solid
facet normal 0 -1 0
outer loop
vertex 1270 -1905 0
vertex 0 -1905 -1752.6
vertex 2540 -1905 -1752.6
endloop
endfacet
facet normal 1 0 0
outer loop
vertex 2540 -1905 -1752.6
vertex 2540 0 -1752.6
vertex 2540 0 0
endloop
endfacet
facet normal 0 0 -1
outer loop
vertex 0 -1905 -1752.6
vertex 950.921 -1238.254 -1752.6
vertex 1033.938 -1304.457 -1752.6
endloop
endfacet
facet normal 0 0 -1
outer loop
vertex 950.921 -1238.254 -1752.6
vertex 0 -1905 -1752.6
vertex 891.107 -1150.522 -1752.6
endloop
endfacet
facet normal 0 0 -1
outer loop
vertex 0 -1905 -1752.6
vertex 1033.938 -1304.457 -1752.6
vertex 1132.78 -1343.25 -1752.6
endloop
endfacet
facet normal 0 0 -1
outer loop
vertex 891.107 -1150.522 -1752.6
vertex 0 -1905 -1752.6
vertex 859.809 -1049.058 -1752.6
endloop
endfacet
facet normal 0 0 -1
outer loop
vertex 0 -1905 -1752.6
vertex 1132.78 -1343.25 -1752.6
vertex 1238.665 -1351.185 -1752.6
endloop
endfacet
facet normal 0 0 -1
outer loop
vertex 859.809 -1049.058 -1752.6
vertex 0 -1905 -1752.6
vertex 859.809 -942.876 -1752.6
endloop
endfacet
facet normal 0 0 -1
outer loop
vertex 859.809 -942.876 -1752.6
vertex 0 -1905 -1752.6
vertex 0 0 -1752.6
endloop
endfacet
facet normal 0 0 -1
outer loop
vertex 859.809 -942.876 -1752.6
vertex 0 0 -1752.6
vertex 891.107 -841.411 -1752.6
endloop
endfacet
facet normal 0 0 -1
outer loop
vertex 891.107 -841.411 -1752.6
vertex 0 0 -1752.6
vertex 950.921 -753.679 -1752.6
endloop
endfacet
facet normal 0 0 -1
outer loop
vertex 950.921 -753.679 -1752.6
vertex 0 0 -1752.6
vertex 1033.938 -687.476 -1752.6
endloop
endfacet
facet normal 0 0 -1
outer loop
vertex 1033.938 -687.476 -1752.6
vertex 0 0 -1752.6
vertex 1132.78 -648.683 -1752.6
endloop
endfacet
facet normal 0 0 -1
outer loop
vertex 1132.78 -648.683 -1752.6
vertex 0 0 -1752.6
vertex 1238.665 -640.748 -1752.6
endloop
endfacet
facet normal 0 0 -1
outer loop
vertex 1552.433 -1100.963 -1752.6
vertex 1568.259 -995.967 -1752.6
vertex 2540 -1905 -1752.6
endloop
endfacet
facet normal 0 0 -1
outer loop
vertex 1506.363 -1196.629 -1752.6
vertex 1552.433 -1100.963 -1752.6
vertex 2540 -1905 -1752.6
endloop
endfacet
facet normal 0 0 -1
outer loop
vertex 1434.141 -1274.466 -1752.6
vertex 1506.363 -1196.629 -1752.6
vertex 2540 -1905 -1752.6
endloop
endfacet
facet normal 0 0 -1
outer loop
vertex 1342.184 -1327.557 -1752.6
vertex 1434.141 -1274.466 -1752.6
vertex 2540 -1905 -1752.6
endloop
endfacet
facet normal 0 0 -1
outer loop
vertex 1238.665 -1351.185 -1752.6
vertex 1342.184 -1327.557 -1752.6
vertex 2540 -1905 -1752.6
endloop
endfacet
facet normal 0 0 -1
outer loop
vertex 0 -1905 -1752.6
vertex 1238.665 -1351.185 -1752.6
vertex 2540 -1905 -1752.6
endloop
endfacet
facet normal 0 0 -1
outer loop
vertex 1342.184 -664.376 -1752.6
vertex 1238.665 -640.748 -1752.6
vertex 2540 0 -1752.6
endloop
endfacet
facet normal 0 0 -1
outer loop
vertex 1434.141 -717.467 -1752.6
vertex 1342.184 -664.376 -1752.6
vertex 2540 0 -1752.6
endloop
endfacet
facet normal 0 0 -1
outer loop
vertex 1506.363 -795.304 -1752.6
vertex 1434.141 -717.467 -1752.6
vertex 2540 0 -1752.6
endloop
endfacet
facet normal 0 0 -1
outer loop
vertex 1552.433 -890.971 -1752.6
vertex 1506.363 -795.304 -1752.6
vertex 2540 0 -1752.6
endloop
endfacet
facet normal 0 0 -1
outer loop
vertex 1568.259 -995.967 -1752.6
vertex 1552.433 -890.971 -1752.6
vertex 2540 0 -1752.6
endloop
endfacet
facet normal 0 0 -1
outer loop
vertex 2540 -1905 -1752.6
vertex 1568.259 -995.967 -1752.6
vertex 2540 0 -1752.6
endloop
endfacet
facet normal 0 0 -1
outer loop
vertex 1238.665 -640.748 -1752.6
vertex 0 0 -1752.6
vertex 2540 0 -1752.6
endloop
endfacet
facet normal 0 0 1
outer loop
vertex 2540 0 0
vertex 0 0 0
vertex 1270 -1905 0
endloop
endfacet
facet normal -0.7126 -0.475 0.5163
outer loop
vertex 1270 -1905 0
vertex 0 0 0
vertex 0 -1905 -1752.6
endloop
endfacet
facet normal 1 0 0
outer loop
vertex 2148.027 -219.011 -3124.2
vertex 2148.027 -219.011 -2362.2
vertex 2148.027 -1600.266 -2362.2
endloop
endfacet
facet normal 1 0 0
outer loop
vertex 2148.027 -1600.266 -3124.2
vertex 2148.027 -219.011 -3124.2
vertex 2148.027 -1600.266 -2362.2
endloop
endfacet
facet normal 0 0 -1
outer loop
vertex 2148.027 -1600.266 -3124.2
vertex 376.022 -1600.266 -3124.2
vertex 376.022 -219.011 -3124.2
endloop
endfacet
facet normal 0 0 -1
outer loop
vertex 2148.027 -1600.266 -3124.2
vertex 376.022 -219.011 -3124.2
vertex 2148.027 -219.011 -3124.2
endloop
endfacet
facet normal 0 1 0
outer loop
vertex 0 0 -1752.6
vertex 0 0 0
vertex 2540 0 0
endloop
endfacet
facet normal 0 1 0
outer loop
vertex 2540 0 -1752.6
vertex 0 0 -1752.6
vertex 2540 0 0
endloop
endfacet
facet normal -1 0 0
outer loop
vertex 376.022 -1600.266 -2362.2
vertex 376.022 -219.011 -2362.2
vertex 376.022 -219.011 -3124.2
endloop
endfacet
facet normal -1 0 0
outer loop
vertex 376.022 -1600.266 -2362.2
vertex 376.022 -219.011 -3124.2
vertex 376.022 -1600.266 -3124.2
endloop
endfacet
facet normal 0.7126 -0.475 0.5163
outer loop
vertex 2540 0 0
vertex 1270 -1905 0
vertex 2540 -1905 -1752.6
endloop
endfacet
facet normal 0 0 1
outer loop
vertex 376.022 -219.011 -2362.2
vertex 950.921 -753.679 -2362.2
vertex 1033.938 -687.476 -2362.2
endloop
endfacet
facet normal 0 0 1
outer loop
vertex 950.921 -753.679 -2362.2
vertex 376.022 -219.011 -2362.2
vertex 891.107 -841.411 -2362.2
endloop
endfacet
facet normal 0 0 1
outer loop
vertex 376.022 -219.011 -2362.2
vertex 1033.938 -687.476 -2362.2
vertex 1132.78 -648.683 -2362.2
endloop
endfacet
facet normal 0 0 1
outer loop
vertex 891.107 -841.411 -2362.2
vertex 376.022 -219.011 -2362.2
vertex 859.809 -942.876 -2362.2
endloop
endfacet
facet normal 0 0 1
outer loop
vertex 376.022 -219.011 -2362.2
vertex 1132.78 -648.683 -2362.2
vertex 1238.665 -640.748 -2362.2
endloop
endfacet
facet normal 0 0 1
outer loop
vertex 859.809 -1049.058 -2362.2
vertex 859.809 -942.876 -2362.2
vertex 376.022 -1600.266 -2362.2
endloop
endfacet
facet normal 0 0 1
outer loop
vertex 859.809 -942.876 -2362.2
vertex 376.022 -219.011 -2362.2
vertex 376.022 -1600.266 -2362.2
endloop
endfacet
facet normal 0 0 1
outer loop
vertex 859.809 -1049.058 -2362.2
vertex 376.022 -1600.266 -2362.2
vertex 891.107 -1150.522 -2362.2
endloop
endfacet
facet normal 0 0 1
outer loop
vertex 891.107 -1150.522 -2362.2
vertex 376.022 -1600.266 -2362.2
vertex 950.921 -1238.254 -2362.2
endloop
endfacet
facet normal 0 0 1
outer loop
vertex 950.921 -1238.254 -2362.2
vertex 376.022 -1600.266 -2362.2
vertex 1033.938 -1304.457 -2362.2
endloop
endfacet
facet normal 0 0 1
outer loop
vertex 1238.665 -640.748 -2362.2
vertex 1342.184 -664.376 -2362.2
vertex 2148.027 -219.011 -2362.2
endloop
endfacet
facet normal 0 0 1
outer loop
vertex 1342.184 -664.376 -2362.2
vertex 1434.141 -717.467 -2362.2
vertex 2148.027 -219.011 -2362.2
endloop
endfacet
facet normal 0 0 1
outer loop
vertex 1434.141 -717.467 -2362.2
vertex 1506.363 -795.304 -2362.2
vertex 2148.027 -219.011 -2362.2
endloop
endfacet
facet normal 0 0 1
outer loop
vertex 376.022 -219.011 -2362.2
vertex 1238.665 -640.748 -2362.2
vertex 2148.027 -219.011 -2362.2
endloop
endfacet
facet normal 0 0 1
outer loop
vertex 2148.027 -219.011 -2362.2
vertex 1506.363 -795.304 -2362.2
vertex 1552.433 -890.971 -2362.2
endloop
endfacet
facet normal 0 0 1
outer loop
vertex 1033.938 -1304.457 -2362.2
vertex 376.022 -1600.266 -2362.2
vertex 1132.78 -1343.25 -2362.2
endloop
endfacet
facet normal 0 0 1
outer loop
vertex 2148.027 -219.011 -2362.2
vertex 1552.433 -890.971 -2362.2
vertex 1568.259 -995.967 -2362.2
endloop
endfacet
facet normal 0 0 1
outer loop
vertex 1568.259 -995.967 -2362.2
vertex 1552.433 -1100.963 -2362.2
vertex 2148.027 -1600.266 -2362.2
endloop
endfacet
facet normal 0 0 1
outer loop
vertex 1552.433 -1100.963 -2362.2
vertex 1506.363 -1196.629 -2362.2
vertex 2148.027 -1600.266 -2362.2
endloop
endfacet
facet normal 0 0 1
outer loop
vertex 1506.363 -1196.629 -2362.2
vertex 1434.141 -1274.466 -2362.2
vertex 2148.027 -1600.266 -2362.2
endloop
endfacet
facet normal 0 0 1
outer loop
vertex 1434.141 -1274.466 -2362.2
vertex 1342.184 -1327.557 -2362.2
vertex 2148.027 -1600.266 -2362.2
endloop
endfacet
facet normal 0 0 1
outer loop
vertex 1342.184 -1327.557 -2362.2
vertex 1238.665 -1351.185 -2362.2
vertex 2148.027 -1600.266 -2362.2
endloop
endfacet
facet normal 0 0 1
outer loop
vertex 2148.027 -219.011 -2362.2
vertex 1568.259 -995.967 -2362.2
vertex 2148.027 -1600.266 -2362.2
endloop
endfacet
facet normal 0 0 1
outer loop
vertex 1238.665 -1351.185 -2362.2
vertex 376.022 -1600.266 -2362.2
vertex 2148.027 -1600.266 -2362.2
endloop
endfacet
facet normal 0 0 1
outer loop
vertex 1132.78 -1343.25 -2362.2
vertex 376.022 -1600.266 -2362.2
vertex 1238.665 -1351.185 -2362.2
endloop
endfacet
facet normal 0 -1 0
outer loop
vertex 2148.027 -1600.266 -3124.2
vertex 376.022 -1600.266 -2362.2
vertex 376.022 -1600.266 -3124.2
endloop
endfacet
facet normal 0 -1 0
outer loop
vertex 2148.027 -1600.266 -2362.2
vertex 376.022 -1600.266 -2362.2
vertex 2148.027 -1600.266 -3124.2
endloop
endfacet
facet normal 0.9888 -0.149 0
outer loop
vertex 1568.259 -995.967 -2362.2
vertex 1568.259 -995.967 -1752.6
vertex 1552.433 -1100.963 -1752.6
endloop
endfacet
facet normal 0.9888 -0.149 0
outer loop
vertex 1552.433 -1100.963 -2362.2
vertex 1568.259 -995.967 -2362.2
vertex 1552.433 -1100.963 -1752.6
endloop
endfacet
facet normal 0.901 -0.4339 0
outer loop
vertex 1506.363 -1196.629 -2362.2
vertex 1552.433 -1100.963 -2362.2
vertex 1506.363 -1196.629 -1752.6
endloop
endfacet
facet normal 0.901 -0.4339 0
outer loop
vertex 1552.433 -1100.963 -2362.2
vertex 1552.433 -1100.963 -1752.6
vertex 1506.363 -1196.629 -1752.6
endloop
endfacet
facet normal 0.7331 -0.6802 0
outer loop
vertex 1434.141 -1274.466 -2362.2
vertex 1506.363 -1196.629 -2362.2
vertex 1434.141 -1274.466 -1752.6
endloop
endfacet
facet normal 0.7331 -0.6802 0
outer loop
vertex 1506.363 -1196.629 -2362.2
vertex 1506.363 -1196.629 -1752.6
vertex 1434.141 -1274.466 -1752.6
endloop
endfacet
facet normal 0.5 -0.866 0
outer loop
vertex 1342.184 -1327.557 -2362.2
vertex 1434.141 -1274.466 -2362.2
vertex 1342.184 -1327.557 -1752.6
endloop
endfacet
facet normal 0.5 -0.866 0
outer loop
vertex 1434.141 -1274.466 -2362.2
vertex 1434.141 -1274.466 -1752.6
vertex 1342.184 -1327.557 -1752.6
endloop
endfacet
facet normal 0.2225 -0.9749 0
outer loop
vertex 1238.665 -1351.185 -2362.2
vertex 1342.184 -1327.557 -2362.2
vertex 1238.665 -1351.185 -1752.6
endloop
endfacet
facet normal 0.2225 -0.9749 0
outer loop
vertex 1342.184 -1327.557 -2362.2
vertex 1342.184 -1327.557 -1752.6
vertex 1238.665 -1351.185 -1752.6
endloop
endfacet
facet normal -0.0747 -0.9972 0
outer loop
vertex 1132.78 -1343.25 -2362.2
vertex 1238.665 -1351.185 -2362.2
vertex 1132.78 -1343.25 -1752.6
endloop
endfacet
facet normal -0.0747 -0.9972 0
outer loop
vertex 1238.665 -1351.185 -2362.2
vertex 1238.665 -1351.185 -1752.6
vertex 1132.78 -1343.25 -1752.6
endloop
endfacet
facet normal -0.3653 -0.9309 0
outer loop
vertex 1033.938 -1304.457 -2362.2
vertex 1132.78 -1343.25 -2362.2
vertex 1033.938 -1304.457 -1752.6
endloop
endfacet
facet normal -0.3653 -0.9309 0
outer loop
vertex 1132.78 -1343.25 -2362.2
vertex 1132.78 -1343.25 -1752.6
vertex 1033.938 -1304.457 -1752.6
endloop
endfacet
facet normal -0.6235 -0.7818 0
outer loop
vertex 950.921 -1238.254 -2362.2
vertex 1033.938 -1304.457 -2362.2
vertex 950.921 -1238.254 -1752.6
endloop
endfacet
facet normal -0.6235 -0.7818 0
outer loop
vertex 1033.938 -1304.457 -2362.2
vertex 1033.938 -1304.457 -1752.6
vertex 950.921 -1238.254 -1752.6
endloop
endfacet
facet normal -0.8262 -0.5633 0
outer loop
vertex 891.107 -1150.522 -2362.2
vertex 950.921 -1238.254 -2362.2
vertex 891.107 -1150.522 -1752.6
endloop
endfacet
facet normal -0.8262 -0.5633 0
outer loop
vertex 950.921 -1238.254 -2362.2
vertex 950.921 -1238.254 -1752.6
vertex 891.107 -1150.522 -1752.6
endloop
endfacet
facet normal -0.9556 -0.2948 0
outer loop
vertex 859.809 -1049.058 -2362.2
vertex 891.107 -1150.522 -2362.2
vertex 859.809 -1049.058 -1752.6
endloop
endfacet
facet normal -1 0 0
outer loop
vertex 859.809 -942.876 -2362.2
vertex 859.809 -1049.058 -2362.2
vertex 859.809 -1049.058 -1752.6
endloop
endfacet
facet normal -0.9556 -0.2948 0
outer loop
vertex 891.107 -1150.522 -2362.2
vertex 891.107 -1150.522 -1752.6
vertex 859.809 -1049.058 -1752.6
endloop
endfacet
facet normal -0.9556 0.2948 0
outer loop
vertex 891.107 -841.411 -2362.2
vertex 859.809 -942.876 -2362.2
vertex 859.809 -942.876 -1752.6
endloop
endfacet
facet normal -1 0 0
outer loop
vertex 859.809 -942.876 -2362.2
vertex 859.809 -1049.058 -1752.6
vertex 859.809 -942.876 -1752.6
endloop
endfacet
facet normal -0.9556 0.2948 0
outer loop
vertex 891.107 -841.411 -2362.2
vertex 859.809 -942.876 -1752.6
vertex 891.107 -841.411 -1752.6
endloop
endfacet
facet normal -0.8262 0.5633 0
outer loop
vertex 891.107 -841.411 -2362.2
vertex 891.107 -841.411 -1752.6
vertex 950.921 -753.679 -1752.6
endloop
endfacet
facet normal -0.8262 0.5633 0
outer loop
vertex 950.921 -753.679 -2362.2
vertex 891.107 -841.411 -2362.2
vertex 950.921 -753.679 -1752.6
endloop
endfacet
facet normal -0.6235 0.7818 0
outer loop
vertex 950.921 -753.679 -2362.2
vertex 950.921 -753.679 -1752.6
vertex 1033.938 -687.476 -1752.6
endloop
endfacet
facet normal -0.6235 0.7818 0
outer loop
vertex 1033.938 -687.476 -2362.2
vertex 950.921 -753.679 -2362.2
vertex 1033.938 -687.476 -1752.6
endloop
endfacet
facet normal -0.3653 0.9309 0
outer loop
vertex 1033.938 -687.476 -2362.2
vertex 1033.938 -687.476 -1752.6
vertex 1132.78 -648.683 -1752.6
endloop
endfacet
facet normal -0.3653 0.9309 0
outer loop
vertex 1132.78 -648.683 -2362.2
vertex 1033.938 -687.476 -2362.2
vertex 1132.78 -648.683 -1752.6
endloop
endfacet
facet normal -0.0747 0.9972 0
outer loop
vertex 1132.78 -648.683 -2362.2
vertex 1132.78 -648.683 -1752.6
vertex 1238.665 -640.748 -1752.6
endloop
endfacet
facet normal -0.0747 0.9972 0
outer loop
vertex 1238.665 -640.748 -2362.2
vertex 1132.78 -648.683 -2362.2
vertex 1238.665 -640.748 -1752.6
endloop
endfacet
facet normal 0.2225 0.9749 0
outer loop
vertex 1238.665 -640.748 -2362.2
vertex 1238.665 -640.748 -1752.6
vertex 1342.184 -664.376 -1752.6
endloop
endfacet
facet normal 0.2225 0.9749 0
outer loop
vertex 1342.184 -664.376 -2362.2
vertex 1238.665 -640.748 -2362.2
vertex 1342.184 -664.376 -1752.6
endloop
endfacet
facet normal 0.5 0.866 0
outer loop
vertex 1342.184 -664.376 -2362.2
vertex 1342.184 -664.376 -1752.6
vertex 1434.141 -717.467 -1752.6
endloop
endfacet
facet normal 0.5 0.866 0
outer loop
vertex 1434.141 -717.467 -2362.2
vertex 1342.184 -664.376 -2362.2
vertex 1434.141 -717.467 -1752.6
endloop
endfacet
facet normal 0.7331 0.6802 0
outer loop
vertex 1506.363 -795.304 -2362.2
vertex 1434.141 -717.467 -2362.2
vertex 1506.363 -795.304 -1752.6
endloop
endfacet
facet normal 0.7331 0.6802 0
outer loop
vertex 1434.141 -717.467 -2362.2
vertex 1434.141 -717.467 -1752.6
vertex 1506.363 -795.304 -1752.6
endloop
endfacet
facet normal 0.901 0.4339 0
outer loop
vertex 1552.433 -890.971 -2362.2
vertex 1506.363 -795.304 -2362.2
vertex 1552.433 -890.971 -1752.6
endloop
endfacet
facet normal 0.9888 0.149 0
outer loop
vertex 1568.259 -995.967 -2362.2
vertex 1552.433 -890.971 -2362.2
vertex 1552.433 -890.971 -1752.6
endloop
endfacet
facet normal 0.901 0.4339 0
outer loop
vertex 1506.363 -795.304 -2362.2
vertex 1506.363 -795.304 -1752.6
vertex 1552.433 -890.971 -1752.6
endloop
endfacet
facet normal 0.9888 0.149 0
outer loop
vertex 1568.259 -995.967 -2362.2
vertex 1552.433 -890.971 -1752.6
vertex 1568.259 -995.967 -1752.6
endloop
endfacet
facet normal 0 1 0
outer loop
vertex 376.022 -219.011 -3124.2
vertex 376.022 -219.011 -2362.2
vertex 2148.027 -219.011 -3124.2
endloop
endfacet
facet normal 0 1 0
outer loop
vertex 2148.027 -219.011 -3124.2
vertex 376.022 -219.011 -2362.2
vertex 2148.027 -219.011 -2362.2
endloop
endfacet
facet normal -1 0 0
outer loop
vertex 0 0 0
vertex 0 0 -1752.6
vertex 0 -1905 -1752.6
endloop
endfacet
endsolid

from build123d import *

# Parameters (mm, degrees)
F0_W      = 2540
F0_H      = 1752.6
F1_DEPTH  = 1905
F6_DEPTH  = 2540
F9_DEPTH  = 2540
F10_R     = 356.2143235098
F11_DEPTH = 609.6
F12_W     = 1772.005200386
F12_H     = 1381.2552392483
F13_DEPTH = 762


with BuildPart() as f1:
    # F0 (on Front) → F1 (new body)
    with BuildSketch(Plane.XZ):
        with Locations((1270, -876.3)):
            Rectangle(F0_W, F0_H)
    extrude(amount=F1_DEPTH)

    # F5 (on 3pt) → F6 (cut)
    with BuildSketch(Plane(origin=(1289.6384771249, -859.7589847499, 934.5206355977), x_dir=(0.3846597509, 0.8799667459, 0.2787389499), z_dir=(0.7125529341, -0.4750352894, 0.5163427059))):
        Polygon((3353.7168502808, 2692.031621933), (-3737.0851039886, 250.3813803196), (-2471.1351394653, -4877.2144317627), (9797.2965240478, -2905.4529666901), align=None)
    extrude(amount=F6_DEPTH, mode=Mode.SUBTRACT)

    # F8 (on 3pt) → F9 (cut)
    with BuildSketch(Plane(origin=(0, 0, 0), x_dir=(0.3846597509, -0.8799667459, -0.2787389499), z_dir=(-0.7125529341, -0.4750352894, 0.5163427059))):
        Polygon((6334.8989486694, 2345.2963829041), (-1106.8929433823, 0), (464.3750488758, -2554.3527603149), (8031.7029953003, -2892.7919864655), align=None)
    extrude(amount=F9_DEPTH, mode=Mode.SUBTRACT)

    # F10 (on face) → F11 (join)
    with BuildSketch(Plane(origin=(0, 0, -1752.6), x_dir=(1, 0, 0), z_dir=(0, 0, -1))):
        with Locations((1212.0447158813, 995.9666728973)):
            Circle(F10_R)
    extrude(amount=F11_DEPTH)

    # F12 (on face) → F13 (join)
    with BuildSketch(Plane(origin=(0, 0, -2362.2), x_dir=(1, 0, 0), z_dir=(0, 0, -1))):
        with Locations((1262.0241045952, 909.6381217241)):
            Rectangle(F12_W, F12_H)
    extrude(amount=F13_DEPTH)


solid = f1.part
